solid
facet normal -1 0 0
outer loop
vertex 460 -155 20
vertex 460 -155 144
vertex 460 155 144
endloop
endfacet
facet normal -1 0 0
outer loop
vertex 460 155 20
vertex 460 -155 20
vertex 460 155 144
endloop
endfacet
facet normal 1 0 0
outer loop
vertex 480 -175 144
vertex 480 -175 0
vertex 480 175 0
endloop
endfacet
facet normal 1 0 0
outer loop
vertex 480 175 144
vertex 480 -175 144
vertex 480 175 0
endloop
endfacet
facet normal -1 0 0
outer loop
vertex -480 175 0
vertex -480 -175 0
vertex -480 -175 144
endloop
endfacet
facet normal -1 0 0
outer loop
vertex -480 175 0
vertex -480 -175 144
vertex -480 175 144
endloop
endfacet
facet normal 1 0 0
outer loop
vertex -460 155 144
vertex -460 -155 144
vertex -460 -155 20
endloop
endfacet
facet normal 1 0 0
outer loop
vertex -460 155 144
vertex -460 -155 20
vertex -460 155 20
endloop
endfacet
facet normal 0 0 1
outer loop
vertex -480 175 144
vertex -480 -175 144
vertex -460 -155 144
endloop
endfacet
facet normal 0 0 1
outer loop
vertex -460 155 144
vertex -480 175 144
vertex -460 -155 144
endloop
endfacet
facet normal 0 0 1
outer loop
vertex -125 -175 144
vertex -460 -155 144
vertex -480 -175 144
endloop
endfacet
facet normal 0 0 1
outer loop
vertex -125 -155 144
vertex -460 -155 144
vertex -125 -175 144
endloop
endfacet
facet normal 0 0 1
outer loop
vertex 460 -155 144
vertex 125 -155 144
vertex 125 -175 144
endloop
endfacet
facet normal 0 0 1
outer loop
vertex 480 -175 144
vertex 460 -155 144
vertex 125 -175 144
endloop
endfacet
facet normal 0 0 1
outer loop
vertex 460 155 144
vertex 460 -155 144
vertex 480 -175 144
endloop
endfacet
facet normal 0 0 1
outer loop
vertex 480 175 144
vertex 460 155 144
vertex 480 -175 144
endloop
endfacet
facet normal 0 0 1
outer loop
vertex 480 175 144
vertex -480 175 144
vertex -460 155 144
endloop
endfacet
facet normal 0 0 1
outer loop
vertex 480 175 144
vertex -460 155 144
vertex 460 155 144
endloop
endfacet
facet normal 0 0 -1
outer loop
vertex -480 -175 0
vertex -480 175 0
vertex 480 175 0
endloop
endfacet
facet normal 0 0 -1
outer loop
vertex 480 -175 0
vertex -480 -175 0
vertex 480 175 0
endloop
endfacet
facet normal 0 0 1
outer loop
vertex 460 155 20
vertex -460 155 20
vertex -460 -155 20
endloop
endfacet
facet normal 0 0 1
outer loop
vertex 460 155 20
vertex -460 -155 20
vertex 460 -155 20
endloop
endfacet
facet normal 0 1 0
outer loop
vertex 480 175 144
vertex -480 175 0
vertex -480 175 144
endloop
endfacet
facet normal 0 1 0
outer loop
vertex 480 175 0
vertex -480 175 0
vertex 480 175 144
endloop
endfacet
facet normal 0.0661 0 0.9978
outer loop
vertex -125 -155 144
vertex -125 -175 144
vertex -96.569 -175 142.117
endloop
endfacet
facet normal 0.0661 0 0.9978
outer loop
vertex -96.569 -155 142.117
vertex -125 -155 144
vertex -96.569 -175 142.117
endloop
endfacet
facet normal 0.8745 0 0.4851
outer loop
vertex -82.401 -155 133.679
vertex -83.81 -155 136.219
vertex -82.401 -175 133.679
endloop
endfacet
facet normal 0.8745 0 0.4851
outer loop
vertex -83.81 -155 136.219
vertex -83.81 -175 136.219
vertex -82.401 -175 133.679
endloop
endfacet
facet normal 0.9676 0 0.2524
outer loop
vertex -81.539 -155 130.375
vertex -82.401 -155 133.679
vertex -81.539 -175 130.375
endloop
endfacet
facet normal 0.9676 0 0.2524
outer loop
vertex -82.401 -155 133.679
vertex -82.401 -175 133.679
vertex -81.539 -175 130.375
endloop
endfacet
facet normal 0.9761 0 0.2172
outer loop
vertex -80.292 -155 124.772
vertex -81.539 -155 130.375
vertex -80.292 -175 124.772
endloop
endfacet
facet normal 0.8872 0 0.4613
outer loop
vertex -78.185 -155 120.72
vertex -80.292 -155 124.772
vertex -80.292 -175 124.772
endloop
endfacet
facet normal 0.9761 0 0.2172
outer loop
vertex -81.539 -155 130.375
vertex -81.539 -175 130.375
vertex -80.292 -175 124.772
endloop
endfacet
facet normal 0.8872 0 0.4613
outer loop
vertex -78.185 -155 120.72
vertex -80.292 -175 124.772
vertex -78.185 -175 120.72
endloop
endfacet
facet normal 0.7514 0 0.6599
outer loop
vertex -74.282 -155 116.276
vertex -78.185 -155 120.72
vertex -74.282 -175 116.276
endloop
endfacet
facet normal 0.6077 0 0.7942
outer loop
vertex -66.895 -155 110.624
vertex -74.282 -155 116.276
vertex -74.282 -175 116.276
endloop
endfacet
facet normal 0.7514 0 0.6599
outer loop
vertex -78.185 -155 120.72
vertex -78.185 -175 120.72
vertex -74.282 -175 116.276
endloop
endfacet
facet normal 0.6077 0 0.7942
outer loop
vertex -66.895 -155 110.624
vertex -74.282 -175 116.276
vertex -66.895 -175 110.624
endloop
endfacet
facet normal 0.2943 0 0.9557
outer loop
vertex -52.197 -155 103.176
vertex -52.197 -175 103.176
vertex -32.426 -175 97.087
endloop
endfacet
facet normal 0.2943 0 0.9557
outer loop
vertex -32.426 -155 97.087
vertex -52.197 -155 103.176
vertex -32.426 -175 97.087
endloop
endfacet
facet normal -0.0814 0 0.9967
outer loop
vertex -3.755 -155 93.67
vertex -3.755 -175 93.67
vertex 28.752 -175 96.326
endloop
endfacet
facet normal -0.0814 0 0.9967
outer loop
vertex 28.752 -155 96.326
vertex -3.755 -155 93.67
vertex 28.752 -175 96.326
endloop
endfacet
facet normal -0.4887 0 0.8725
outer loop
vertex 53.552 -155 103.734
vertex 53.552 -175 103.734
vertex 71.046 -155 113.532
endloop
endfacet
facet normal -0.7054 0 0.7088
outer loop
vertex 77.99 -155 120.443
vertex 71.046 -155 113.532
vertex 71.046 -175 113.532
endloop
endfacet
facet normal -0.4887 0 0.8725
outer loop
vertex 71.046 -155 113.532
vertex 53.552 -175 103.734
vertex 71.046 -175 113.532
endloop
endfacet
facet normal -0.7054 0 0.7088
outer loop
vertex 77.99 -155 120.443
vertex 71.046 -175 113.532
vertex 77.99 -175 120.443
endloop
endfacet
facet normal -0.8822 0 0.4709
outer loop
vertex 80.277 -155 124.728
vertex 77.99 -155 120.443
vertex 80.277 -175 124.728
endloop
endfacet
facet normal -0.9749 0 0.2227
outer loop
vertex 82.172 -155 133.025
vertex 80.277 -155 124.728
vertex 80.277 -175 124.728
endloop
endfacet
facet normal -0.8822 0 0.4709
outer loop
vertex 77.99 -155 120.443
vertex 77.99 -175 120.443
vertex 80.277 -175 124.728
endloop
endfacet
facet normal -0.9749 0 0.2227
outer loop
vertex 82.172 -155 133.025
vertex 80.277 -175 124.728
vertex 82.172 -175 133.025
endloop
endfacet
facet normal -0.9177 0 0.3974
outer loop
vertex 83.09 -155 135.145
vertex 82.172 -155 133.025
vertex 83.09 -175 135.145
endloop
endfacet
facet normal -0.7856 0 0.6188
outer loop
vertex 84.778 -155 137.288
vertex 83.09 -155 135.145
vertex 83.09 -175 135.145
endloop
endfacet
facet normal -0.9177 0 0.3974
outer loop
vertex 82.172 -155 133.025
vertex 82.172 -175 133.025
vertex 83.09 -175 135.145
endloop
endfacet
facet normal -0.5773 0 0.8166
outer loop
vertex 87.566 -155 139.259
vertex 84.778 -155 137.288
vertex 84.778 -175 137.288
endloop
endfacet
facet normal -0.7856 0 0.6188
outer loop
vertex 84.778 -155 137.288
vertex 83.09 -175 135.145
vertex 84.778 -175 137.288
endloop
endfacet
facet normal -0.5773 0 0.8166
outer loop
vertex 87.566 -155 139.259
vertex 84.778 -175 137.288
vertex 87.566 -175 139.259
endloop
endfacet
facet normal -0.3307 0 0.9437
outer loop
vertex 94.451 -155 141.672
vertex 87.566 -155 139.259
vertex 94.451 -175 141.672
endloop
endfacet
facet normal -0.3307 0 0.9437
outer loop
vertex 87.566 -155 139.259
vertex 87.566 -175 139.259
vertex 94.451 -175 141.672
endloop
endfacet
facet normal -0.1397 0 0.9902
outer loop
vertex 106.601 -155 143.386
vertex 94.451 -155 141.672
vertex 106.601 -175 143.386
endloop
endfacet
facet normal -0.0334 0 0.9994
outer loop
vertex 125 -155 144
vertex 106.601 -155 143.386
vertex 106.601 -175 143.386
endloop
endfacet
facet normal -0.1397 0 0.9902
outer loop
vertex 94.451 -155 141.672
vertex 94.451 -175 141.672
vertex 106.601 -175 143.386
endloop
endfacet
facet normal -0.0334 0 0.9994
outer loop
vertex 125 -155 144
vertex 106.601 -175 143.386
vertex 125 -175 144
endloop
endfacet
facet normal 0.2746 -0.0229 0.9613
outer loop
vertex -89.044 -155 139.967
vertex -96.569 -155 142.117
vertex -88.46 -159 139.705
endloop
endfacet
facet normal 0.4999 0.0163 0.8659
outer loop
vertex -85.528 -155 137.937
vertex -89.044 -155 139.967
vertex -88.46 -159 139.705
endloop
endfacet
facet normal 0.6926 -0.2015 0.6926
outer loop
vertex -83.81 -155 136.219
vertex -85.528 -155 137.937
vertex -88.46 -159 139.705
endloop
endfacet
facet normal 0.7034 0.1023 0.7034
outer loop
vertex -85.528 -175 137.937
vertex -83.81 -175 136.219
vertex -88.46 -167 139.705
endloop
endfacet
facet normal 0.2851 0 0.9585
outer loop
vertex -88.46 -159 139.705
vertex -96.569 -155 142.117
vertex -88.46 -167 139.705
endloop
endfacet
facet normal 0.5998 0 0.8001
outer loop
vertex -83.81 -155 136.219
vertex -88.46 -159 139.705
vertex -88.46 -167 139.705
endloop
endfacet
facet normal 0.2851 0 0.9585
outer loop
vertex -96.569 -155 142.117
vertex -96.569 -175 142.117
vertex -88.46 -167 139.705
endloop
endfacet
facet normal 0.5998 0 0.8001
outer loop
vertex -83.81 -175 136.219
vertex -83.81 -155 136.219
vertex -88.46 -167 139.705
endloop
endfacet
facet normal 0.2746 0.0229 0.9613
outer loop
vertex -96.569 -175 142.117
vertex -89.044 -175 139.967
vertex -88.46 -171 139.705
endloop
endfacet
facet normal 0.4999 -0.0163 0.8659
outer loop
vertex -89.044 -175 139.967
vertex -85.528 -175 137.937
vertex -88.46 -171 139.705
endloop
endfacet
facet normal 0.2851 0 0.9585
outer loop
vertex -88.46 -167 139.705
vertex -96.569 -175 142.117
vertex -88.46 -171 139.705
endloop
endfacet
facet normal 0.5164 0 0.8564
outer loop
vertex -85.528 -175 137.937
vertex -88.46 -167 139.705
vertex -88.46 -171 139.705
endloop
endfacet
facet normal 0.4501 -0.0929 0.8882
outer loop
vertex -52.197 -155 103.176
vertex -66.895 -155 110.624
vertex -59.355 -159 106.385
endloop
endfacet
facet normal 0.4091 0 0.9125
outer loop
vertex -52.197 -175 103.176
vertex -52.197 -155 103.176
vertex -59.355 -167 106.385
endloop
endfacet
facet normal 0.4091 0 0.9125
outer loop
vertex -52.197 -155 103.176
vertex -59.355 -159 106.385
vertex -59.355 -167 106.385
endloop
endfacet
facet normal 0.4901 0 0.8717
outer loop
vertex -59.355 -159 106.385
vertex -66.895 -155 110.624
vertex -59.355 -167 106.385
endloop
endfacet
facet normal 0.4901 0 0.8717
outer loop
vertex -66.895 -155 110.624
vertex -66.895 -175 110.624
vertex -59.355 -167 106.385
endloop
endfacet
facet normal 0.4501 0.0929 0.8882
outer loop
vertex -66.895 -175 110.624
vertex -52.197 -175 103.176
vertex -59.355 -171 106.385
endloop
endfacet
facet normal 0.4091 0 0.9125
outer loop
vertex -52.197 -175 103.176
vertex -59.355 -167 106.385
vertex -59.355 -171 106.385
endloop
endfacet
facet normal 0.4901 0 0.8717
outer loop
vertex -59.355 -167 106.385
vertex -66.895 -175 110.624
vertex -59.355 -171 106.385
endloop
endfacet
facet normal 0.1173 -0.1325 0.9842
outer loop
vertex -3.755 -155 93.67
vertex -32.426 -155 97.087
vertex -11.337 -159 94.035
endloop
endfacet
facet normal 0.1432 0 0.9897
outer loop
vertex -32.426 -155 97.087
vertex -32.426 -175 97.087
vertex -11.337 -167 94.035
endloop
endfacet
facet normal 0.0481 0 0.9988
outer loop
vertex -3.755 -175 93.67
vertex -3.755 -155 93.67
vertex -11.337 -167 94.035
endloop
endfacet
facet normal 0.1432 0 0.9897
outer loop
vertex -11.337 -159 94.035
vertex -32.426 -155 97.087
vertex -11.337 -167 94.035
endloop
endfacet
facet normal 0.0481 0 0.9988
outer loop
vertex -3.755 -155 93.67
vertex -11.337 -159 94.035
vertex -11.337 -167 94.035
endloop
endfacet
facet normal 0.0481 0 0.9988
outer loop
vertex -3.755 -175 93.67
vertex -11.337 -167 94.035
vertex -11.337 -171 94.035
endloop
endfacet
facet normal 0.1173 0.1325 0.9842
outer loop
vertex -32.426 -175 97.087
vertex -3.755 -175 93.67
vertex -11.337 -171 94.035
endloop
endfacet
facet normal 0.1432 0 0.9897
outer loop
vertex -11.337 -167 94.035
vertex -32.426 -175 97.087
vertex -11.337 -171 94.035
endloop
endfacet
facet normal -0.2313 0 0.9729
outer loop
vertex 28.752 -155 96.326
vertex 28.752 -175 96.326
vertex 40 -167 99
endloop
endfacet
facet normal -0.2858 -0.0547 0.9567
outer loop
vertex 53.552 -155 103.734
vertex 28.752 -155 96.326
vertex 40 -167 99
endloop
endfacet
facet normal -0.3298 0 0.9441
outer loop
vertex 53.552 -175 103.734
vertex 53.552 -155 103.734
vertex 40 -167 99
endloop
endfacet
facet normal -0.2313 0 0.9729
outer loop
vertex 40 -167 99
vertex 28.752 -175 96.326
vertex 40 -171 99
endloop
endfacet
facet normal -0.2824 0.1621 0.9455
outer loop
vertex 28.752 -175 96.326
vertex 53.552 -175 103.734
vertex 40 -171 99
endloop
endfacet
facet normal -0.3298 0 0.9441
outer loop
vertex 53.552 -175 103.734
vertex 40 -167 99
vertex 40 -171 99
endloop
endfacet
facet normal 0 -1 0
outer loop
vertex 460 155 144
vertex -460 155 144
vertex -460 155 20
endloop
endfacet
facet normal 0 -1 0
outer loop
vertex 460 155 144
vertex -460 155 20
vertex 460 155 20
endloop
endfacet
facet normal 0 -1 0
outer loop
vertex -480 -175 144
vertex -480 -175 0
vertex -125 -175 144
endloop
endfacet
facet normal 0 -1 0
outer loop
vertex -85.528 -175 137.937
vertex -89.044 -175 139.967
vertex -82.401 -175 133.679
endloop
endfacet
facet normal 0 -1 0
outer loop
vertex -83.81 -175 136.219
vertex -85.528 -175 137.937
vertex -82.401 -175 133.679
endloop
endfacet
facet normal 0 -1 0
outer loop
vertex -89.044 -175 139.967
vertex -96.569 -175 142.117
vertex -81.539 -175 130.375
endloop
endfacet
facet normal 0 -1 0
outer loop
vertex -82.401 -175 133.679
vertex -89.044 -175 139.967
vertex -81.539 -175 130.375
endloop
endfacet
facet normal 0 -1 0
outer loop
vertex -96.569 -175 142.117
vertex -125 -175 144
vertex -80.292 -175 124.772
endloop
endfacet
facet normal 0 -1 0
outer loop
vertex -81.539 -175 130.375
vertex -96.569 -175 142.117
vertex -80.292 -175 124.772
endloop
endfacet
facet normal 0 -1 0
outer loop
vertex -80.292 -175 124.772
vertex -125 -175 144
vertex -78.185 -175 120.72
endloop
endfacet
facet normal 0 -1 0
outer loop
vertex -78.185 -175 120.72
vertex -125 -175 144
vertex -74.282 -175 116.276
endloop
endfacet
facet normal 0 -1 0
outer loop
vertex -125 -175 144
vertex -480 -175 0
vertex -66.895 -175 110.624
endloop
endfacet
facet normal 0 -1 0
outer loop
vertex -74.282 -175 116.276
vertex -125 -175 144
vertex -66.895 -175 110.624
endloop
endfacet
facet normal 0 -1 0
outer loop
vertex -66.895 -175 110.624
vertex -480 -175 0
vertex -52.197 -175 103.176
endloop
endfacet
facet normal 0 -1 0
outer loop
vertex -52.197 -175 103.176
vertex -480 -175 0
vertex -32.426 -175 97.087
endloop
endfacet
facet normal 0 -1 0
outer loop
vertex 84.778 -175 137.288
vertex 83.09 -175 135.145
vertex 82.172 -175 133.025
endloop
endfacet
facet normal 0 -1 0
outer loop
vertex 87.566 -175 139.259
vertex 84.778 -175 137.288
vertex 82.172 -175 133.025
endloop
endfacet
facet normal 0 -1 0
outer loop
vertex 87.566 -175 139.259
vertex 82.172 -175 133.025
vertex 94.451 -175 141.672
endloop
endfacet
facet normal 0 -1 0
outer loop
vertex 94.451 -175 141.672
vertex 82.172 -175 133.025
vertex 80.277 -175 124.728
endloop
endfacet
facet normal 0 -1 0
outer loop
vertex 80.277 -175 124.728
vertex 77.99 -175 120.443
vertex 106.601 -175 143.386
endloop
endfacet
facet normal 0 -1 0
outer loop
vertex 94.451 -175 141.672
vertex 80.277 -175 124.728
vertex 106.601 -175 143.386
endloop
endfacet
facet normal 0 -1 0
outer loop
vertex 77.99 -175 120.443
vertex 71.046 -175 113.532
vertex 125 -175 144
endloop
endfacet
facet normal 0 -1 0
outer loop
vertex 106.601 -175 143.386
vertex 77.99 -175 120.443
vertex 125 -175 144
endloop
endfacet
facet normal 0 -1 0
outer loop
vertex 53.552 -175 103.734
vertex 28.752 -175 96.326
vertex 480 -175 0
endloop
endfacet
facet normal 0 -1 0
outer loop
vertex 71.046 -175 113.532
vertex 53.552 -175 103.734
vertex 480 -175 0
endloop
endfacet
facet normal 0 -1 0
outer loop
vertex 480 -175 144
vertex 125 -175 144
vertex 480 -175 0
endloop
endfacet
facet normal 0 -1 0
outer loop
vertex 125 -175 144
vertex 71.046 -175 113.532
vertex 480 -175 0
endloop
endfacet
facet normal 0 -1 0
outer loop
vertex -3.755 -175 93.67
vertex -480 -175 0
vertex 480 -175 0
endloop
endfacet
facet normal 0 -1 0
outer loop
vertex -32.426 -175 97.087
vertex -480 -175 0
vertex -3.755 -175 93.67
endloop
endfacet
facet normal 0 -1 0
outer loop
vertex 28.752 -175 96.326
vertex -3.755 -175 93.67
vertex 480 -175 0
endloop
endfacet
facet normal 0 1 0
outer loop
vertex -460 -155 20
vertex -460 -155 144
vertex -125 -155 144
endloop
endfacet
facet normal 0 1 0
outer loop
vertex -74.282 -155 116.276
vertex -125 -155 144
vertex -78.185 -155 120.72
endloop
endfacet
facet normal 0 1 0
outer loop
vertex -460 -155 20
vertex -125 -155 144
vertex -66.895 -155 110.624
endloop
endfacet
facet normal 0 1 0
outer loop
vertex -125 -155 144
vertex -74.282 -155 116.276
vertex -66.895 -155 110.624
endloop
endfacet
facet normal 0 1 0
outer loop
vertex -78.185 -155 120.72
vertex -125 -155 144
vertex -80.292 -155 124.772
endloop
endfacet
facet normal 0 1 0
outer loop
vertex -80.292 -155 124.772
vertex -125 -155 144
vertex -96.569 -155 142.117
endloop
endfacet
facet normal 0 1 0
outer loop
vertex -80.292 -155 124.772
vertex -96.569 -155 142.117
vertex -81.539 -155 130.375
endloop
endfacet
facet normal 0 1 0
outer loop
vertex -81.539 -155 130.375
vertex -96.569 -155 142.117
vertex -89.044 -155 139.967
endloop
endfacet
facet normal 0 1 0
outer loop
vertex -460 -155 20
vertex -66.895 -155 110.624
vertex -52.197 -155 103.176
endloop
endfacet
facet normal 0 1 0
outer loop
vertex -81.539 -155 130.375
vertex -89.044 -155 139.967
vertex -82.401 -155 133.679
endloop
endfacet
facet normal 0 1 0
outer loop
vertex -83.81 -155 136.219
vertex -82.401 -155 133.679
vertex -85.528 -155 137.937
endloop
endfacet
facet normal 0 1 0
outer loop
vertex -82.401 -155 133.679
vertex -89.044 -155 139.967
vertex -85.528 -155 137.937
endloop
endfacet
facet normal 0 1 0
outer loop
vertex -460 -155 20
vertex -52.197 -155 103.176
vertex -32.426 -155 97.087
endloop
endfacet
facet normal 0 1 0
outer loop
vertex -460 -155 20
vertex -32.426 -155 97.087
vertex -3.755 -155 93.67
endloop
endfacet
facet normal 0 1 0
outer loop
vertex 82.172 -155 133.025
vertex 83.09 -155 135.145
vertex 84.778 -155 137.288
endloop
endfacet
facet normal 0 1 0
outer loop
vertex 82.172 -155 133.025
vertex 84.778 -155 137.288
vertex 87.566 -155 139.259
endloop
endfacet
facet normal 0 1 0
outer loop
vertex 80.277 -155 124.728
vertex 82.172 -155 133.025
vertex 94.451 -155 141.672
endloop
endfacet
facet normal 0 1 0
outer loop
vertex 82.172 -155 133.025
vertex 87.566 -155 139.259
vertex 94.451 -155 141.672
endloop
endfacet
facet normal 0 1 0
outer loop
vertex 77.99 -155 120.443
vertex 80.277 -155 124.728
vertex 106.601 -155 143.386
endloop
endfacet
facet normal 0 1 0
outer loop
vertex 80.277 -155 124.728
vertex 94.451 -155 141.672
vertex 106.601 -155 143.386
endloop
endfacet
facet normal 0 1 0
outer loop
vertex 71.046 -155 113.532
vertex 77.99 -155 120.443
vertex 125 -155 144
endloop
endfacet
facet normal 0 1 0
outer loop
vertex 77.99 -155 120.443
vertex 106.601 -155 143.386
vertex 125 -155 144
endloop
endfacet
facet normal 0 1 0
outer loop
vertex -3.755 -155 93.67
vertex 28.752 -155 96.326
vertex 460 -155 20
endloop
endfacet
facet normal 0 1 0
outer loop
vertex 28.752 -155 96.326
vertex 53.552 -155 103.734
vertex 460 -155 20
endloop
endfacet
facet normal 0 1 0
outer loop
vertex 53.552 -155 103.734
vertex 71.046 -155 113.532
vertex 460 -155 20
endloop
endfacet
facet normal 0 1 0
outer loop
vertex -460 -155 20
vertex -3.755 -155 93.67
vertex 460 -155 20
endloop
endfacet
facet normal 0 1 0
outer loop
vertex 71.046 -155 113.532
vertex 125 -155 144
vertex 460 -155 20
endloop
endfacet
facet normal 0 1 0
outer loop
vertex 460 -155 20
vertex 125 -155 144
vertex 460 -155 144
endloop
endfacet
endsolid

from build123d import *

# Parameters (mm, degrees)
F0_W     = 960
F0_H     = 350
F1_DEPTH = 144
F2_W     = 920
F2_H     = 310
F3_DEPTH = 124
F5_DEPTH = 20


with BuildPart() as f1:
    # F0 (on Top) → F1 (new body)
    with BuildSketch(Plane.XY):
        Rectangle(F0_W, F0_H)
    extrude(amount=F1_DEPTH)

    # F2 (on face) → F3 (cut)
    with BuildSketch(Plane.XY.offset(144)):
        Rectangle(F2_W, F2_H)
    extrude(amount=-F3_DEPTH, mode=Mode.SUBTRACT)

    # F4 (on face) → F5 (cut)
    with BuildSketch(Plane.XZ.offset(175)):
        with BuildLine():
            Line((125, 144), (-125, 144))
            add(Edge.make_bspline(
                [(-125, 144), (-75, 144), (-93.0105845008, 124.1732701609), (-37.6218932166, 91.8329972806), (37.6218932166, 91.8329972806), (93.0105845008, 124.1732701609), (75, 144), (125, 144)],
                knots=[0, 0, 0, 0, 0.1911314136, 0.3781938731, 0.6218061269, 0.8088685864, 1, 1, 1, 1], degree=3))
        make_face()
    extrude(amount=-F5_DEPTH, mode=Mode.SUBTRACT)


solid = f1.part
